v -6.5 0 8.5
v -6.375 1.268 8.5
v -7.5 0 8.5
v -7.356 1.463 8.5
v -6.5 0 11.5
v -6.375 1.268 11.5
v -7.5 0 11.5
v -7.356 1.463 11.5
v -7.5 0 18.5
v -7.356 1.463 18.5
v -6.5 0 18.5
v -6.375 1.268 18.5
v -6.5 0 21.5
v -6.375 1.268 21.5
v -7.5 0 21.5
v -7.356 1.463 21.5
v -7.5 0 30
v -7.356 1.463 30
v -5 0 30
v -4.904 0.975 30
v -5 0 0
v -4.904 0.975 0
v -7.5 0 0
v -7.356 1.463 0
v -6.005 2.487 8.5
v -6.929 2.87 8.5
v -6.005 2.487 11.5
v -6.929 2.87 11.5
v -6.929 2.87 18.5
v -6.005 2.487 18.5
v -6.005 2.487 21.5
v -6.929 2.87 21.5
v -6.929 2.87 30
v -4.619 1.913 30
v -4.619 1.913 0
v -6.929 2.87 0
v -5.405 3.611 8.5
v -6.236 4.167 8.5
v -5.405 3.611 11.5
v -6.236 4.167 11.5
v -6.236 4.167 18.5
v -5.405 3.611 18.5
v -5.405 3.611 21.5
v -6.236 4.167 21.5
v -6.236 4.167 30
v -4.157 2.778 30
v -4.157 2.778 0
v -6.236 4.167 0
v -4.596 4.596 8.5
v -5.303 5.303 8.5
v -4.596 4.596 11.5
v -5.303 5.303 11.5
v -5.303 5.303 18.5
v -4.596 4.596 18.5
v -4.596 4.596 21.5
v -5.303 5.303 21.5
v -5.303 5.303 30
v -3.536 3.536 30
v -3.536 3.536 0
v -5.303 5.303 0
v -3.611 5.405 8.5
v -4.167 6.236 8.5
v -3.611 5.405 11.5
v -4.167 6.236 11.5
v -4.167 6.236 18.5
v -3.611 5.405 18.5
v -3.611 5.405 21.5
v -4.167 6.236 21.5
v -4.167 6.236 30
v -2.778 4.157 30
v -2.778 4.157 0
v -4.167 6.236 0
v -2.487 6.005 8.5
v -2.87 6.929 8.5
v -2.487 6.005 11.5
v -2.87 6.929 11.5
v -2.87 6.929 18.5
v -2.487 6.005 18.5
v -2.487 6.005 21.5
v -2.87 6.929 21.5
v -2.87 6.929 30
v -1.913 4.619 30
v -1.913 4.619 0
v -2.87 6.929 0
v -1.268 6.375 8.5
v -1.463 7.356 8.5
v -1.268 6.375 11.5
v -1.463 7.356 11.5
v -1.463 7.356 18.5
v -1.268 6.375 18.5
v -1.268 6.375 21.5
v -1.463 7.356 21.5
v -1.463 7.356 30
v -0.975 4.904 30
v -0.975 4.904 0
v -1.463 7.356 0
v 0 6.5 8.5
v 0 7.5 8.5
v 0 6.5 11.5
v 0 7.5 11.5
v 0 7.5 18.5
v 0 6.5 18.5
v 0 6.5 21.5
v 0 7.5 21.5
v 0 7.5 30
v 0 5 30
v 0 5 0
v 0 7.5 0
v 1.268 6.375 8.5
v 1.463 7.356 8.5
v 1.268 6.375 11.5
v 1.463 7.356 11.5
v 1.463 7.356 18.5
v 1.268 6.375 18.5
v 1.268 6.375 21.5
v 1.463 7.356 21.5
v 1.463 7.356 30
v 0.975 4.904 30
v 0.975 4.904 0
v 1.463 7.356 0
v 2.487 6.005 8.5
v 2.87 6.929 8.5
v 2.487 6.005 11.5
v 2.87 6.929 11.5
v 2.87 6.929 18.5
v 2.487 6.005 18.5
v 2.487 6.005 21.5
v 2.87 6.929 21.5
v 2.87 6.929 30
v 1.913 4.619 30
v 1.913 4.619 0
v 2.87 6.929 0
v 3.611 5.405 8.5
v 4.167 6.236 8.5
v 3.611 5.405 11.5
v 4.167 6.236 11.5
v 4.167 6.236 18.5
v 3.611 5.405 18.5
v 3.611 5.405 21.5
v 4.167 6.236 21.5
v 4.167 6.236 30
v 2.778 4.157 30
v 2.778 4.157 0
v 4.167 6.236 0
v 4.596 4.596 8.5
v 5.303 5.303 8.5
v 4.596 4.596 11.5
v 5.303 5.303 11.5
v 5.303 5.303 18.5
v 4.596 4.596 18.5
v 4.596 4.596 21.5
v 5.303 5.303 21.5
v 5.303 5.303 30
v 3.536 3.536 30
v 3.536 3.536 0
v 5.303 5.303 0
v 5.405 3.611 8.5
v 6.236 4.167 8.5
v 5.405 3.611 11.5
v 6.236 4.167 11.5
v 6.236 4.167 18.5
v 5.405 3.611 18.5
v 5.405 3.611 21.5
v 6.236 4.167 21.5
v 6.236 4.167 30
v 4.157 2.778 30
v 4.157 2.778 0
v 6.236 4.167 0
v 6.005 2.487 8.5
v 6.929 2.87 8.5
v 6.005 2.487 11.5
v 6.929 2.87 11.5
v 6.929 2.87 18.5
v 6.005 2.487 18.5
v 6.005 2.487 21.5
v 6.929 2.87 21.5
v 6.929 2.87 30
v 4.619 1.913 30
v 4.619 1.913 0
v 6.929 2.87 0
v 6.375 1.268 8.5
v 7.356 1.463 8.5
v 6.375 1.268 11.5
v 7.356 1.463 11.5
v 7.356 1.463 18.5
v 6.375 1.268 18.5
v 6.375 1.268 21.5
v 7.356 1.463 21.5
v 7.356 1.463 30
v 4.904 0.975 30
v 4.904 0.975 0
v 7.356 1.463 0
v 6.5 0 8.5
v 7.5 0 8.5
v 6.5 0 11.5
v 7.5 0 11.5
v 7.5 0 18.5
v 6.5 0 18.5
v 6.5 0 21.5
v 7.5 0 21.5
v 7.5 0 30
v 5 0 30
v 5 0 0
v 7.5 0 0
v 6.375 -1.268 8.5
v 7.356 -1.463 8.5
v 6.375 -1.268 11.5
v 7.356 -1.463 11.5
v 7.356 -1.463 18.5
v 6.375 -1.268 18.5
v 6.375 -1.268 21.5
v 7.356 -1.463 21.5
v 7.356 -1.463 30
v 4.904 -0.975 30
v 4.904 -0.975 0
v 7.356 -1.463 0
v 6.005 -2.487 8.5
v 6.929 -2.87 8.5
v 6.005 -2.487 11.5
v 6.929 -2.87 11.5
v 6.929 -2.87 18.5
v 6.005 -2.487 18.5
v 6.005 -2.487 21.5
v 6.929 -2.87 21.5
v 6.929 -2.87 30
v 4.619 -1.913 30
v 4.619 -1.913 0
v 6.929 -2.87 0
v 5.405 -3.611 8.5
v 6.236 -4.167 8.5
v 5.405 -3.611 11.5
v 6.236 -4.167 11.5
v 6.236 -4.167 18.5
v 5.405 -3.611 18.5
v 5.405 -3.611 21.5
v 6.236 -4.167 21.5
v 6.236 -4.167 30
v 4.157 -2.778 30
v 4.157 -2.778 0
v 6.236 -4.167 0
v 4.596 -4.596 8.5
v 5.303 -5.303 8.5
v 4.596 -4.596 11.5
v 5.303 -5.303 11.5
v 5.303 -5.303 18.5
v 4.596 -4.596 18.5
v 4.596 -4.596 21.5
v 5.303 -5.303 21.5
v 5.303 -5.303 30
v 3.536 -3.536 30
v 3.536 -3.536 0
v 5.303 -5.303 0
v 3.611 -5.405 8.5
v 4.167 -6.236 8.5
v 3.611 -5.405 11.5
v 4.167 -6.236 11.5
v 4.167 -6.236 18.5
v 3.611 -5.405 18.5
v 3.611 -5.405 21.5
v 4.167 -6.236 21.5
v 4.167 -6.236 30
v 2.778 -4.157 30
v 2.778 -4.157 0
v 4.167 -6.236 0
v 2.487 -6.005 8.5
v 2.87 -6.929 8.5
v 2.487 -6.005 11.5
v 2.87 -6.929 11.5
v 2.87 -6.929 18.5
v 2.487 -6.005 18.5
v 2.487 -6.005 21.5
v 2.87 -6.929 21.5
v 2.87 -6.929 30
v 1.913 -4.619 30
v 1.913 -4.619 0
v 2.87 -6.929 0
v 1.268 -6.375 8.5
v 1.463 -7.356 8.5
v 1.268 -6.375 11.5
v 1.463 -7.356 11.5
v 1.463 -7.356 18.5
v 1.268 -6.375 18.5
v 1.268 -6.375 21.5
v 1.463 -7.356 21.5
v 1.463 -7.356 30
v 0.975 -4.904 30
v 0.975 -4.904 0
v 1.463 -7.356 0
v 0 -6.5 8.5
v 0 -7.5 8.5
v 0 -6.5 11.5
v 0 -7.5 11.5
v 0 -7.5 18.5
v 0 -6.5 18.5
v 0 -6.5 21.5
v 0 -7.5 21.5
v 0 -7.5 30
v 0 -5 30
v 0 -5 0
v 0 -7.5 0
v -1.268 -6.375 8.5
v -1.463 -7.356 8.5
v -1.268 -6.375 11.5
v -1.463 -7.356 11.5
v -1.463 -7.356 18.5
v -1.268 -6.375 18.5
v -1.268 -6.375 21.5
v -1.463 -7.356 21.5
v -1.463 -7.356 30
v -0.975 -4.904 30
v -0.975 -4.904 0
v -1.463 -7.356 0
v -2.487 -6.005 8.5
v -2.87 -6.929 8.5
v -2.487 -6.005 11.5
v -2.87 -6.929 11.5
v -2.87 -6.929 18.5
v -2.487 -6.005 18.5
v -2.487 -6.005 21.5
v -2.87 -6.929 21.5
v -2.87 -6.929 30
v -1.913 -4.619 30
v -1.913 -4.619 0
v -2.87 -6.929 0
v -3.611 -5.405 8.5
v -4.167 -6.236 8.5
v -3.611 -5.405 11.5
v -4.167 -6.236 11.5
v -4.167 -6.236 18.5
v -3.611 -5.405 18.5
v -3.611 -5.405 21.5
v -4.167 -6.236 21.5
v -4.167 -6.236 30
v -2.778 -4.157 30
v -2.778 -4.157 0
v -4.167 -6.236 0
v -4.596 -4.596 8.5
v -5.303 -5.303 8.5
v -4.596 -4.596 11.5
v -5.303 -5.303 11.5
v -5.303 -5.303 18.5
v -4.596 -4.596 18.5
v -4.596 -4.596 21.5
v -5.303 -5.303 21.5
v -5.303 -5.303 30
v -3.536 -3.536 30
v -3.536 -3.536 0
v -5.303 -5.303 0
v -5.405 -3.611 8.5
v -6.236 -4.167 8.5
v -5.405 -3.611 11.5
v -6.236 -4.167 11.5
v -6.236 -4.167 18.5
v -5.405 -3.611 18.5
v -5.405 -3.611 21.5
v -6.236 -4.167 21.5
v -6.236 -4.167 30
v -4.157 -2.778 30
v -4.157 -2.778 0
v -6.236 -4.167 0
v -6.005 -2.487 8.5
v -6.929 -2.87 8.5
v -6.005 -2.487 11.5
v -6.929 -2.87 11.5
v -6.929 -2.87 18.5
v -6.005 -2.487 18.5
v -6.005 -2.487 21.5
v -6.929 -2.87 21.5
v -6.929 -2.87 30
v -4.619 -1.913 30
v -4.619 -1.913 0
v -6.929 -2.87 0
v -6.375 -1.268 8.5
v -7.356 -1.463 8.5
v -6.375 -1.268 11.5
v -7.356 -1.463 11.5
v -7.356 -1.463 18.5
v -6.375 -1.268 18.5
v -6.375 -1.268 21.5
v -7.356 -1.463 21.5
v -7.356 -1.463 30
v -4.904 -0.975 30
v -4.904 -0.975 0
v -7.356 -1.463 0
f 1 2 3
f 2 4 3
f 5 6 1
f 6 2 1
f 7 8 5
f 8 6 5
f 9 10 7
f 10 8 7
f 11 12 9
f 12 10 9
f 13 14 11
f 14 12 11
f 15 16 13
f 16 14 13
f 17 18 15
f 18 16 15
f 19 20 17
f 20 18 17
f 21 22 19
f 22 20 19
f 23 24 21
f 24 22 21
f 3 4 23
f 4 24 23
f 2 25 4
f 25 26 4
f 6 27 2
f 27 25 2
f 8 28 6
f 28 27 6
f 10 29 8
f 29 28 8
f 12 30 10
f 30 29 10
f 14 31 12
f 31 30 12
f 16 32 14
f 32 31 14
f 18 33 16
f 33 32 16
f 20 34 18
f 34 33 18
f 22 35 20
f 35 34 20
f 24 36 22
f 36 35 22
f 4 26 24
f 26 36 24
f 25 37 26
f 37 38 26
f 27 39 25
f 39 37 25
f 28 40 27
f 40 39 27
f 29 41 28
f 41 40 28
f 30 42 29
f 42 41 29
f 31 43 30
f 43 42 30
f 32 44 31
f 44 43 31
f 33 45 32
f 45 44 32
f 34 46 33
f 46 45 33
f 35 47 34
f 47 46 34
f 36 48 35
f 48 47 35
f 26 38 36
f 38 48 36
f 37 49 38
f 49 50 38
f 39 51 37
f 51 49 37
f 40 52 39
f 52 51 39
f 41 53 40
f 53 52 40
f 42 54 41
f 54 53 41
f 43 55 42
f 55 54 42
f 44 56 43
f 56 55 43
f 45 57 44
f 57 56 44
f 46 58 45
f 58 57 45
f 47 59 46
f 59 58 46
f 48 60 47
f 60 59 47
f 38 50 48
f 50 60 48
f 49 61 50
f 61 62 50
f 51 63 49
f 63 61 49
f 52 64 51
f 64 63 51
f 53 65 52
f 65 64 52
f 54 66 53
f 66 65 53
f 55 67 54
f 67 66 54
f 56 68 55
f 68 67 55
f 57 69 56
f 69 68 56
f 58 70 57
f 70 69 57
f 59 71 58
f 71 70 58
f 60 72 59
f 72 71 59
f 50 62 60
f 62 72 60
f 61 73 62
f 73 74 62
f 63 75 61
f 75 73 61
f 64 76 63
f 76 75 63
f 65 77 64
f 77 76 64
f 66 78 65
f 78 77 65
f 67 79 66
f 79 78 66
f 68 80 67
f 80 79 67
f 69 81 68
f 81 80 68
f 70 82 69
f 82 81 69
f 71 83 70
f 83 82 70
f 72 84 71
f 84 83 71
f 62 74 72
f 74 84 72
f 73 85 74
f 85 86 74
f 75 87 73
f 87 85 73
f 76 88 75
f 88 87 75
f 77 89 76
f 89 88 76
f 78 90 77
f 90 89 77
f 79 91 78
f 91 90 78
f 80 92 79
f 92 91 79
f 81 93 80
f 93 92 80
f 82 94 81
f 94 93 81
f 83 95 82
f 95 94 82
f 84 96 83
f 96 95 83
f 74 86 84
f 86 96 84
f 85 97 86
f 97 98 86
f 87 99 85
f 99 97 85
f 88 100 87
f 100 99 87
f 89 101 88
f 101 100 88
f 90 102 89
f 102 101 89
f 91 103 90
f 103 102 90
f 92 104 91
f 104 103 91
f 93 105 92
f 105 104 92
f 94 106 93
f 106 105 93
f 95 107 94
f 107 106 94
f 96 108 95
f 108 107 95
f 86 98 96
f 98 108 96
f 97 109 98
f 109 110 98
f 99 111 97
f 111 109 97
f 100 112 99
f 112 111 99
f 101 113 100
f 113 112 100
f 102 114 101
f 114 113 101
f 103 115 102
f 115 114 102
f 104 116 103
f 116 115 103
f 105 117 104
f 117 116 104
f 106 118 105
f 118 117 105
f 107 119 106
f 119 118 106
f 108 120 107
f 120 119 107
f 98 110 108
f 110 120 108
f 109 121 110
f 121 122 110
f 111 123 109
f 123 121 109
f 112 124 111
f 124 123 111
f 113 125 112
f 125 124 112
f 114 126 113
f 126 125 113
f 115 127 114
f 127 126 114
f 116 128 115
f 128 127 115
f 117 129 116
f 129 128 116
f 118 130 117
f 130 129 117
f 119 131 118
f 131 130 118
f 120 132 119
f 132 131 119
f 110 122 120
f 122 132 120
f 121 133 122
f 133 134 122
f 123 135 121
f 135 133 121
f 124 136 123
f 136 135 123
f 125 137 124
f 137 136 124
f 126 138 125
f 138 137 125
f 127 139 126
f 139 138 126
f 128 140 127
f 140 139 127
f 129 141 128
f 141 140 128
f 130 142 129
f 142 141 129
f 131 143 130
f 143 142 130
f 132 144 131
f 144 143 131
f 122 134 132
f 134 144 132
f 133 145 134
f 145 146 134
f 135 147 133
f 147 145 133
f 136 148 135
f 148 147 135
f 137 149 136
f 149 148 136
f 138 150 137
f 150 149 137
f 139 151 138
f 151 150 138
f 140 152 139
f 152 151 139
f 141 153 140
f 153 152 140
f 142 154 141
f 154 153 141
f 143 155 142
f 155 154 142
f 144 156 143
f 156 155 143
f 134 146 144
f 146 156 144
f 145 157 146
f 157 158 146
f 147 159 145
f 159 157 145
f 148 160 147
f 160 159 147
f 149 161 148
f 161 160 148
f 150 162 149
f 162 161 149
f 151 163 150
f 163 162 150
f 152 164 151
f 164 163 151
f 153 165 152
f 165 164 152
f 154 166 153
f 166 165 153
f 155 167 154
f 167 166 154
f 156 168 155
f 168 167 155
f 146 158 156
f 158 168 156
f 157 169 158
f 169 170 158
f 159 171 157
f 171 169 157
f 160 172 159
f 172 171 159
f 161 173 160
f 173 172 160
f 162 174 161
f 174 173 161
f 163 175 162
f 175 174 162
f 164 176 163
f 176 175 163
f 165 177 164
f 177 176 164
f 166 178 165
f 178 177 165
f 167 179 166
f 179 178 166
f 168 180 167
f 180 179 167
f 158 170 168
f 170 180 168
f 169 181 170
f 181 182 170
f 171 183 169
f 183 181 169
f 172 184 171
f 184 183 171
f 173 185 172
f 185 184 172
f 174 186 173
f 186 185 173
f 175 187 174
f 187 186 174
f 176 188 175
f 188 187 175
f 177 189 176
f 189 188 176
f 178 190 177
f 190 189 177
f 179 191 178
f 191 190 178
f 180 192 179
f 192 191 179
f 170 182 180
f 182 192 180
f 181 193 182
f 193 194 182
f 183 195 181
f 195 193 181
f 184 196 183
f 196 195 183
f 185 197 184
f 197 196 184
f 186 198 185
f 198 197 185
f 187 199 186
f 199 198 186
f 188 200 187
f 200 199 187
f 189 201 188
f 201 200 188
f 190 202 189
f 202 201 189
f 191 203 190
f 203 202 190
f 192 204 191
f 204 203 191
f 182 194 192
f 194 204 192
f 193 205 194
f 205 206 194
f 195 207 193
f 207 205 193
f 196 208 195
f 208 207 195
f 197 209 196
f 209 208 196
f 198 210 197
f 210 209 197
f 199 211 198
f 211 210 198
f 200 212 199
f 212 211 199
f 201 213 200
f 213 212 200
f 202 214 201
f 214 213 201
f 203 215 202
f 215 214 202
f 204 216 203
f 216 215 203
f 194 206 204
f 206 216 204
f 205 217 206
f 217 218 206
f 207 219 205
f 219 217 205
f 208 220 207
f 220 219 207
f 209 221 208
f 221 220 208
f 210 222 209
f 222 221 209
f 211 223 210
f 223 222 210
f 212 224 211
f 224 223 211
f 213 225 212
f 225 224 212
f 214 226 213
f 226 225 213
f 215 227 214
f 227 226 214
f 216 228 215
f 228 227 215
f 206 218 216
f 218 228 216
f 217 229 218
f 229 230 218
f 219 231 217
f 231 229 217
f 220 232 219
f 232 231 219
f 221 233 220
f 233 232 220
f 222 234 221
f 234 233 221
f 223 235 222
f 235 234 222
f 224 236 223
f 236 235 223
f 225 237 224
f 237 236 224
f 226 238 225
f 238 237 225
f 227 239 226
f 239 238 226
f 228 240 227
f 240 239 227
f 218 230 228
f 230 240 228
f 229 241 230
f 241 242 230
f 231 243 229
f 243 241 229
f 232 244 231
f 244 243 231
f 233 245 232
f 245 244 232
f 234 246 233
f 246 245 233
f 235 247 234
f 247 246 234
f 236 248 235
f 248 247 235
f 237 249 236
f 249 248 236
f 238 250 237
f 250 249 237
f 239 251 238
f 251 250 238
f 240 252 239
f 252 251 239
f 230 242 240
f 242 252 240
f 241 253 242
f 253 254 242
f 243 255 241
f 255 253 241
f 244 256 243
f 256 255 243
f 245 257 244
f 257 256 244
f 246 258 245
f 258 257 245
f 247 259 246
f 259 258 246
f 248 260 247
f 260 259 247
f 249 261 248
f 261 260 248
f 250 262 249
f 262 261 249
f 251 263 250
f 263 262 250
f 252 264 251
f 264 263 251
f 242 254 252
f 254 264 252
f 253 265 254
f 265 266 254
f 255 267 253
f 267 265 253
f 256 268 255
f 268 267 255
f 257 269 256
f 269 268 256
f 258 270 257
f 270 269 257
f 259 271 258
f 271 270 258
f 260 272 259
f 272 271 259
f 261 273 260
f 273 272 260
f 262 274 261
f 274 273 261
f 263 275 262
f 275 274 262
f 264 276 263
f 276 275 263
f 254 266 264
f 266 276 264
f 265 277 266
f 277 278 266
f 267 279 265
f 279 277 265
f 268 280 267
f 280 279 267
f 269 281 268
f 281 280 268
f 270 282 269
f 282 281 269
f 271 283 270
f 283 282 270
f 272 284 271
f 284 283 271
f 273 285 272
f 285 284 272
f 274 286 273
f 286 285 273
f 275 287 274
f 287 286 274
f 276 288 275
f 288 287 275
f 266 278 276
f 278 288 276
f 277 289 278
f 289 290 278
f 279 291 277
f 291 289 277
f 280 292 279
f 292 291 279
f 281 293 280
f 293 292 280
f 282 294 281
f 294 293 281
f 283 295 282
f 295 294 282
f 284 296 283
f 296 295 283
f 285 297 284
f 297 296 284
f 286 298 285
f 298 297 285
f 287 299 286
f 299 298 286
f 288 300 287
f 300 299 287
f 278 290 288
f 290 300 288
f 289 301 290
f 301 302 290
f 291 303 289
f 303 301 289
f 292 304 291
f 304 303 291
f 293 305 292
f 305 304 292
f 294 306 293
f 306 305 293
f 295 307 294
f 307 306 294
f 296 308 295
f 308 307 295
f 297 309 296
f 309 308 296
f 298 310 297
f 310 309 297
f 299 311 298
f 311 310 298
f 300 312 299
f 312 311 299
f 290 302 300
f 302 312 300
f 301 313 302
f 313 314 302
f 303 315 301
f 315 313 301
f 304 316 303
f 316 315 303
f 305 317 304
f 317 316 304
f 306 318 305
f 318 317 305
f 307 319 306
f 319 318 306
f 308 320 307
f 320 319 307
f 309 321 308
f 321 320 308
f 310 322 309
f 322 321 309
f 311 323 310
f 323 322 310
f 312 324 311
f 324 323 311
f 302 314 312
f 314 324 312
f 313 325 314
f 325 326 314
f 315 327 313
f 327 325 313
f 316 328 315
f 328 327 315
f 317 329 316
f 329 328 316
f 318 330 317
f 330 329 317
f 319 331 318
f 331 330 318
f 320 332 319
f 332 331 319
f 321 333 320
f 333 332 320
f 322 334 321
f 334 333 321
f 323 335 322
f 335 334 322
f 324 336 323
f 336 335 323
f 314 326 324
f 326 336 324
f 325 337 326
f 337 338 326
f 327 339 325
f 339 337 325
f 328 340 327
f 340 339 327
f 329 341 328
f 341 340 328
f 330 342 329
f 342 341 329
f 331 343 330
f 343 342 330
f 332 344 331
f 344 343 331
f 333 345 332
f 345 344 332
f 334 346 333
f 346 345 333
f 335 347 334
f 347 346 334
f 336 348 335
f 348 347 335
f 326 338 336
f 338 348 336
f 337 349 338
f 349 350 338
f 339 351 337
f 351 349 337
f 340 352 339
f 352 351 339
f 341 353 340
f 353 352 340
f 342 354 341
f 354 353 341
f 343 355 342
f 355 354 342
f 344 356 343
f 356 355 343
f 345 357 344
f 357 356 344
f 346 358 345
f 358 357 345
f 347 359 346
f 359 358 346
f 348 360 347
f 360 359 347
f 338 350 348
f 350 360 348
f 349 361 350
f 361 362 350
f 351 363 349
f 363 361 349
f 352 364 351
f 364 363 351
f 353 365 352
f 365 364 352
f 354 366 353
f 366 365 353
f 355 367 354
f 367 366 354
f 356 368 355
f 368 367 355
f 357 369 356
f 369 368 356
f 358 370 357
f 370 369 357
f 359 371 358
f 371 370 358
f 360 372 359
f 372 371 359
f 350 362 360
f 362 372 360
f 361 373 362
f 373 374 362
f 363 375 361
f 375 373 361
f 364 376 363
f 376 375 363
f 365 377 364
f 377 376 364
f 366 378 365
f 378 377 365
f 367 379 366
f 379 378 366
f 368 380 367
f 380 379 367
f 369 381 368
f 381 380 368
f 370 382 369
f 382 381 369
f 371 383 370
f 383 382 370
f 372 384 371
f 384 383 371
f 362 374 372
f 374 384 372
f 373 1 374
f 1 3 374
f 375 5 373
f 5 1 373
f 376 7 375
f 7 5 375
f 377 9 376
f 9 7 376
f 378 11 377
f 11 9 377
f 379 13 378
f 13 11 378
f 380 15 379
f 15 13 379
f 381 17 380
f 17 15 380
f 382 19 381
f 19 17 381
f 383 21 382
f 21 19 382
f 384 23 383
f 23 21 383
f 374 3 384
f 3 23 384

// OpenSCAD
$fn = 32;

// ----------------------------------------------------------------------
// Grooved revolve: stepped, bore R5
// ----------------------------------------------------------------------

// --- parameters (mm) ---
bore_r = 5;               // bore radius
outer_r = 7.5;            // outer radius of the body
total_h = 30;             // overall height, Z
wall = 2.5;               // radial wall thickness
groove_w = 3;             // groove width
groove_d = 1;             // groove depth
grooves = 2;              // number of outer grooves
fit_tol = 0.02;           // declared fit tolerance (prompt contract)
free_tol = 0.2;           // declared free tolerance (prompt contract)

bbox_x = 2 * outer_r;  // full diameter
bore_d = 2 * bore_r;  // bore diameter
body_d = 2 * outer_r;  // body diameter
revolve_angle = 360;  // full turn around the Z axis

profile = [[5, 0], [7.5, 0], [7.5, 8.5], [6.5, 8.5], [6.5, 11.5], [7.5, 11.5], [7.5, 18.5], [6.5, 18.5], [6.5, 21.5], [7.5, 21.5], [7.5, 30], [5, 30]];  // primary outline, 12 points, counter clockwise

// --- the one profile operation ---
rotate_extrude(angle = revolve_angle) polygon(points = profile);
